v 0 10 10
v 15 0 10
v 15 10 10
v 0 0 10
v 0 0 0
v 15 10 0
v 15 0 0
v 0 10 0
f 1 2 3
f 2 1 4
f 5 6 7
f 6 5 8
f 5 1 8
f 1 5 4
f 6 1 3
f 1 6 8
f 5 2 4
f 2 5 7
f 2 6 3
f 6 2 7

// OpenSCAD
// Nested user modules: the chain for part 2 reads a -> translate -> b -> cube,
// with the "module " prefix stripped from the module steps.
module a() {
  translate([5, 0, 0]) b();
}
module b() {
  cube(10);
}
cube(10);  // part 1
a();       // part 2: overlaps part 1 by 500
